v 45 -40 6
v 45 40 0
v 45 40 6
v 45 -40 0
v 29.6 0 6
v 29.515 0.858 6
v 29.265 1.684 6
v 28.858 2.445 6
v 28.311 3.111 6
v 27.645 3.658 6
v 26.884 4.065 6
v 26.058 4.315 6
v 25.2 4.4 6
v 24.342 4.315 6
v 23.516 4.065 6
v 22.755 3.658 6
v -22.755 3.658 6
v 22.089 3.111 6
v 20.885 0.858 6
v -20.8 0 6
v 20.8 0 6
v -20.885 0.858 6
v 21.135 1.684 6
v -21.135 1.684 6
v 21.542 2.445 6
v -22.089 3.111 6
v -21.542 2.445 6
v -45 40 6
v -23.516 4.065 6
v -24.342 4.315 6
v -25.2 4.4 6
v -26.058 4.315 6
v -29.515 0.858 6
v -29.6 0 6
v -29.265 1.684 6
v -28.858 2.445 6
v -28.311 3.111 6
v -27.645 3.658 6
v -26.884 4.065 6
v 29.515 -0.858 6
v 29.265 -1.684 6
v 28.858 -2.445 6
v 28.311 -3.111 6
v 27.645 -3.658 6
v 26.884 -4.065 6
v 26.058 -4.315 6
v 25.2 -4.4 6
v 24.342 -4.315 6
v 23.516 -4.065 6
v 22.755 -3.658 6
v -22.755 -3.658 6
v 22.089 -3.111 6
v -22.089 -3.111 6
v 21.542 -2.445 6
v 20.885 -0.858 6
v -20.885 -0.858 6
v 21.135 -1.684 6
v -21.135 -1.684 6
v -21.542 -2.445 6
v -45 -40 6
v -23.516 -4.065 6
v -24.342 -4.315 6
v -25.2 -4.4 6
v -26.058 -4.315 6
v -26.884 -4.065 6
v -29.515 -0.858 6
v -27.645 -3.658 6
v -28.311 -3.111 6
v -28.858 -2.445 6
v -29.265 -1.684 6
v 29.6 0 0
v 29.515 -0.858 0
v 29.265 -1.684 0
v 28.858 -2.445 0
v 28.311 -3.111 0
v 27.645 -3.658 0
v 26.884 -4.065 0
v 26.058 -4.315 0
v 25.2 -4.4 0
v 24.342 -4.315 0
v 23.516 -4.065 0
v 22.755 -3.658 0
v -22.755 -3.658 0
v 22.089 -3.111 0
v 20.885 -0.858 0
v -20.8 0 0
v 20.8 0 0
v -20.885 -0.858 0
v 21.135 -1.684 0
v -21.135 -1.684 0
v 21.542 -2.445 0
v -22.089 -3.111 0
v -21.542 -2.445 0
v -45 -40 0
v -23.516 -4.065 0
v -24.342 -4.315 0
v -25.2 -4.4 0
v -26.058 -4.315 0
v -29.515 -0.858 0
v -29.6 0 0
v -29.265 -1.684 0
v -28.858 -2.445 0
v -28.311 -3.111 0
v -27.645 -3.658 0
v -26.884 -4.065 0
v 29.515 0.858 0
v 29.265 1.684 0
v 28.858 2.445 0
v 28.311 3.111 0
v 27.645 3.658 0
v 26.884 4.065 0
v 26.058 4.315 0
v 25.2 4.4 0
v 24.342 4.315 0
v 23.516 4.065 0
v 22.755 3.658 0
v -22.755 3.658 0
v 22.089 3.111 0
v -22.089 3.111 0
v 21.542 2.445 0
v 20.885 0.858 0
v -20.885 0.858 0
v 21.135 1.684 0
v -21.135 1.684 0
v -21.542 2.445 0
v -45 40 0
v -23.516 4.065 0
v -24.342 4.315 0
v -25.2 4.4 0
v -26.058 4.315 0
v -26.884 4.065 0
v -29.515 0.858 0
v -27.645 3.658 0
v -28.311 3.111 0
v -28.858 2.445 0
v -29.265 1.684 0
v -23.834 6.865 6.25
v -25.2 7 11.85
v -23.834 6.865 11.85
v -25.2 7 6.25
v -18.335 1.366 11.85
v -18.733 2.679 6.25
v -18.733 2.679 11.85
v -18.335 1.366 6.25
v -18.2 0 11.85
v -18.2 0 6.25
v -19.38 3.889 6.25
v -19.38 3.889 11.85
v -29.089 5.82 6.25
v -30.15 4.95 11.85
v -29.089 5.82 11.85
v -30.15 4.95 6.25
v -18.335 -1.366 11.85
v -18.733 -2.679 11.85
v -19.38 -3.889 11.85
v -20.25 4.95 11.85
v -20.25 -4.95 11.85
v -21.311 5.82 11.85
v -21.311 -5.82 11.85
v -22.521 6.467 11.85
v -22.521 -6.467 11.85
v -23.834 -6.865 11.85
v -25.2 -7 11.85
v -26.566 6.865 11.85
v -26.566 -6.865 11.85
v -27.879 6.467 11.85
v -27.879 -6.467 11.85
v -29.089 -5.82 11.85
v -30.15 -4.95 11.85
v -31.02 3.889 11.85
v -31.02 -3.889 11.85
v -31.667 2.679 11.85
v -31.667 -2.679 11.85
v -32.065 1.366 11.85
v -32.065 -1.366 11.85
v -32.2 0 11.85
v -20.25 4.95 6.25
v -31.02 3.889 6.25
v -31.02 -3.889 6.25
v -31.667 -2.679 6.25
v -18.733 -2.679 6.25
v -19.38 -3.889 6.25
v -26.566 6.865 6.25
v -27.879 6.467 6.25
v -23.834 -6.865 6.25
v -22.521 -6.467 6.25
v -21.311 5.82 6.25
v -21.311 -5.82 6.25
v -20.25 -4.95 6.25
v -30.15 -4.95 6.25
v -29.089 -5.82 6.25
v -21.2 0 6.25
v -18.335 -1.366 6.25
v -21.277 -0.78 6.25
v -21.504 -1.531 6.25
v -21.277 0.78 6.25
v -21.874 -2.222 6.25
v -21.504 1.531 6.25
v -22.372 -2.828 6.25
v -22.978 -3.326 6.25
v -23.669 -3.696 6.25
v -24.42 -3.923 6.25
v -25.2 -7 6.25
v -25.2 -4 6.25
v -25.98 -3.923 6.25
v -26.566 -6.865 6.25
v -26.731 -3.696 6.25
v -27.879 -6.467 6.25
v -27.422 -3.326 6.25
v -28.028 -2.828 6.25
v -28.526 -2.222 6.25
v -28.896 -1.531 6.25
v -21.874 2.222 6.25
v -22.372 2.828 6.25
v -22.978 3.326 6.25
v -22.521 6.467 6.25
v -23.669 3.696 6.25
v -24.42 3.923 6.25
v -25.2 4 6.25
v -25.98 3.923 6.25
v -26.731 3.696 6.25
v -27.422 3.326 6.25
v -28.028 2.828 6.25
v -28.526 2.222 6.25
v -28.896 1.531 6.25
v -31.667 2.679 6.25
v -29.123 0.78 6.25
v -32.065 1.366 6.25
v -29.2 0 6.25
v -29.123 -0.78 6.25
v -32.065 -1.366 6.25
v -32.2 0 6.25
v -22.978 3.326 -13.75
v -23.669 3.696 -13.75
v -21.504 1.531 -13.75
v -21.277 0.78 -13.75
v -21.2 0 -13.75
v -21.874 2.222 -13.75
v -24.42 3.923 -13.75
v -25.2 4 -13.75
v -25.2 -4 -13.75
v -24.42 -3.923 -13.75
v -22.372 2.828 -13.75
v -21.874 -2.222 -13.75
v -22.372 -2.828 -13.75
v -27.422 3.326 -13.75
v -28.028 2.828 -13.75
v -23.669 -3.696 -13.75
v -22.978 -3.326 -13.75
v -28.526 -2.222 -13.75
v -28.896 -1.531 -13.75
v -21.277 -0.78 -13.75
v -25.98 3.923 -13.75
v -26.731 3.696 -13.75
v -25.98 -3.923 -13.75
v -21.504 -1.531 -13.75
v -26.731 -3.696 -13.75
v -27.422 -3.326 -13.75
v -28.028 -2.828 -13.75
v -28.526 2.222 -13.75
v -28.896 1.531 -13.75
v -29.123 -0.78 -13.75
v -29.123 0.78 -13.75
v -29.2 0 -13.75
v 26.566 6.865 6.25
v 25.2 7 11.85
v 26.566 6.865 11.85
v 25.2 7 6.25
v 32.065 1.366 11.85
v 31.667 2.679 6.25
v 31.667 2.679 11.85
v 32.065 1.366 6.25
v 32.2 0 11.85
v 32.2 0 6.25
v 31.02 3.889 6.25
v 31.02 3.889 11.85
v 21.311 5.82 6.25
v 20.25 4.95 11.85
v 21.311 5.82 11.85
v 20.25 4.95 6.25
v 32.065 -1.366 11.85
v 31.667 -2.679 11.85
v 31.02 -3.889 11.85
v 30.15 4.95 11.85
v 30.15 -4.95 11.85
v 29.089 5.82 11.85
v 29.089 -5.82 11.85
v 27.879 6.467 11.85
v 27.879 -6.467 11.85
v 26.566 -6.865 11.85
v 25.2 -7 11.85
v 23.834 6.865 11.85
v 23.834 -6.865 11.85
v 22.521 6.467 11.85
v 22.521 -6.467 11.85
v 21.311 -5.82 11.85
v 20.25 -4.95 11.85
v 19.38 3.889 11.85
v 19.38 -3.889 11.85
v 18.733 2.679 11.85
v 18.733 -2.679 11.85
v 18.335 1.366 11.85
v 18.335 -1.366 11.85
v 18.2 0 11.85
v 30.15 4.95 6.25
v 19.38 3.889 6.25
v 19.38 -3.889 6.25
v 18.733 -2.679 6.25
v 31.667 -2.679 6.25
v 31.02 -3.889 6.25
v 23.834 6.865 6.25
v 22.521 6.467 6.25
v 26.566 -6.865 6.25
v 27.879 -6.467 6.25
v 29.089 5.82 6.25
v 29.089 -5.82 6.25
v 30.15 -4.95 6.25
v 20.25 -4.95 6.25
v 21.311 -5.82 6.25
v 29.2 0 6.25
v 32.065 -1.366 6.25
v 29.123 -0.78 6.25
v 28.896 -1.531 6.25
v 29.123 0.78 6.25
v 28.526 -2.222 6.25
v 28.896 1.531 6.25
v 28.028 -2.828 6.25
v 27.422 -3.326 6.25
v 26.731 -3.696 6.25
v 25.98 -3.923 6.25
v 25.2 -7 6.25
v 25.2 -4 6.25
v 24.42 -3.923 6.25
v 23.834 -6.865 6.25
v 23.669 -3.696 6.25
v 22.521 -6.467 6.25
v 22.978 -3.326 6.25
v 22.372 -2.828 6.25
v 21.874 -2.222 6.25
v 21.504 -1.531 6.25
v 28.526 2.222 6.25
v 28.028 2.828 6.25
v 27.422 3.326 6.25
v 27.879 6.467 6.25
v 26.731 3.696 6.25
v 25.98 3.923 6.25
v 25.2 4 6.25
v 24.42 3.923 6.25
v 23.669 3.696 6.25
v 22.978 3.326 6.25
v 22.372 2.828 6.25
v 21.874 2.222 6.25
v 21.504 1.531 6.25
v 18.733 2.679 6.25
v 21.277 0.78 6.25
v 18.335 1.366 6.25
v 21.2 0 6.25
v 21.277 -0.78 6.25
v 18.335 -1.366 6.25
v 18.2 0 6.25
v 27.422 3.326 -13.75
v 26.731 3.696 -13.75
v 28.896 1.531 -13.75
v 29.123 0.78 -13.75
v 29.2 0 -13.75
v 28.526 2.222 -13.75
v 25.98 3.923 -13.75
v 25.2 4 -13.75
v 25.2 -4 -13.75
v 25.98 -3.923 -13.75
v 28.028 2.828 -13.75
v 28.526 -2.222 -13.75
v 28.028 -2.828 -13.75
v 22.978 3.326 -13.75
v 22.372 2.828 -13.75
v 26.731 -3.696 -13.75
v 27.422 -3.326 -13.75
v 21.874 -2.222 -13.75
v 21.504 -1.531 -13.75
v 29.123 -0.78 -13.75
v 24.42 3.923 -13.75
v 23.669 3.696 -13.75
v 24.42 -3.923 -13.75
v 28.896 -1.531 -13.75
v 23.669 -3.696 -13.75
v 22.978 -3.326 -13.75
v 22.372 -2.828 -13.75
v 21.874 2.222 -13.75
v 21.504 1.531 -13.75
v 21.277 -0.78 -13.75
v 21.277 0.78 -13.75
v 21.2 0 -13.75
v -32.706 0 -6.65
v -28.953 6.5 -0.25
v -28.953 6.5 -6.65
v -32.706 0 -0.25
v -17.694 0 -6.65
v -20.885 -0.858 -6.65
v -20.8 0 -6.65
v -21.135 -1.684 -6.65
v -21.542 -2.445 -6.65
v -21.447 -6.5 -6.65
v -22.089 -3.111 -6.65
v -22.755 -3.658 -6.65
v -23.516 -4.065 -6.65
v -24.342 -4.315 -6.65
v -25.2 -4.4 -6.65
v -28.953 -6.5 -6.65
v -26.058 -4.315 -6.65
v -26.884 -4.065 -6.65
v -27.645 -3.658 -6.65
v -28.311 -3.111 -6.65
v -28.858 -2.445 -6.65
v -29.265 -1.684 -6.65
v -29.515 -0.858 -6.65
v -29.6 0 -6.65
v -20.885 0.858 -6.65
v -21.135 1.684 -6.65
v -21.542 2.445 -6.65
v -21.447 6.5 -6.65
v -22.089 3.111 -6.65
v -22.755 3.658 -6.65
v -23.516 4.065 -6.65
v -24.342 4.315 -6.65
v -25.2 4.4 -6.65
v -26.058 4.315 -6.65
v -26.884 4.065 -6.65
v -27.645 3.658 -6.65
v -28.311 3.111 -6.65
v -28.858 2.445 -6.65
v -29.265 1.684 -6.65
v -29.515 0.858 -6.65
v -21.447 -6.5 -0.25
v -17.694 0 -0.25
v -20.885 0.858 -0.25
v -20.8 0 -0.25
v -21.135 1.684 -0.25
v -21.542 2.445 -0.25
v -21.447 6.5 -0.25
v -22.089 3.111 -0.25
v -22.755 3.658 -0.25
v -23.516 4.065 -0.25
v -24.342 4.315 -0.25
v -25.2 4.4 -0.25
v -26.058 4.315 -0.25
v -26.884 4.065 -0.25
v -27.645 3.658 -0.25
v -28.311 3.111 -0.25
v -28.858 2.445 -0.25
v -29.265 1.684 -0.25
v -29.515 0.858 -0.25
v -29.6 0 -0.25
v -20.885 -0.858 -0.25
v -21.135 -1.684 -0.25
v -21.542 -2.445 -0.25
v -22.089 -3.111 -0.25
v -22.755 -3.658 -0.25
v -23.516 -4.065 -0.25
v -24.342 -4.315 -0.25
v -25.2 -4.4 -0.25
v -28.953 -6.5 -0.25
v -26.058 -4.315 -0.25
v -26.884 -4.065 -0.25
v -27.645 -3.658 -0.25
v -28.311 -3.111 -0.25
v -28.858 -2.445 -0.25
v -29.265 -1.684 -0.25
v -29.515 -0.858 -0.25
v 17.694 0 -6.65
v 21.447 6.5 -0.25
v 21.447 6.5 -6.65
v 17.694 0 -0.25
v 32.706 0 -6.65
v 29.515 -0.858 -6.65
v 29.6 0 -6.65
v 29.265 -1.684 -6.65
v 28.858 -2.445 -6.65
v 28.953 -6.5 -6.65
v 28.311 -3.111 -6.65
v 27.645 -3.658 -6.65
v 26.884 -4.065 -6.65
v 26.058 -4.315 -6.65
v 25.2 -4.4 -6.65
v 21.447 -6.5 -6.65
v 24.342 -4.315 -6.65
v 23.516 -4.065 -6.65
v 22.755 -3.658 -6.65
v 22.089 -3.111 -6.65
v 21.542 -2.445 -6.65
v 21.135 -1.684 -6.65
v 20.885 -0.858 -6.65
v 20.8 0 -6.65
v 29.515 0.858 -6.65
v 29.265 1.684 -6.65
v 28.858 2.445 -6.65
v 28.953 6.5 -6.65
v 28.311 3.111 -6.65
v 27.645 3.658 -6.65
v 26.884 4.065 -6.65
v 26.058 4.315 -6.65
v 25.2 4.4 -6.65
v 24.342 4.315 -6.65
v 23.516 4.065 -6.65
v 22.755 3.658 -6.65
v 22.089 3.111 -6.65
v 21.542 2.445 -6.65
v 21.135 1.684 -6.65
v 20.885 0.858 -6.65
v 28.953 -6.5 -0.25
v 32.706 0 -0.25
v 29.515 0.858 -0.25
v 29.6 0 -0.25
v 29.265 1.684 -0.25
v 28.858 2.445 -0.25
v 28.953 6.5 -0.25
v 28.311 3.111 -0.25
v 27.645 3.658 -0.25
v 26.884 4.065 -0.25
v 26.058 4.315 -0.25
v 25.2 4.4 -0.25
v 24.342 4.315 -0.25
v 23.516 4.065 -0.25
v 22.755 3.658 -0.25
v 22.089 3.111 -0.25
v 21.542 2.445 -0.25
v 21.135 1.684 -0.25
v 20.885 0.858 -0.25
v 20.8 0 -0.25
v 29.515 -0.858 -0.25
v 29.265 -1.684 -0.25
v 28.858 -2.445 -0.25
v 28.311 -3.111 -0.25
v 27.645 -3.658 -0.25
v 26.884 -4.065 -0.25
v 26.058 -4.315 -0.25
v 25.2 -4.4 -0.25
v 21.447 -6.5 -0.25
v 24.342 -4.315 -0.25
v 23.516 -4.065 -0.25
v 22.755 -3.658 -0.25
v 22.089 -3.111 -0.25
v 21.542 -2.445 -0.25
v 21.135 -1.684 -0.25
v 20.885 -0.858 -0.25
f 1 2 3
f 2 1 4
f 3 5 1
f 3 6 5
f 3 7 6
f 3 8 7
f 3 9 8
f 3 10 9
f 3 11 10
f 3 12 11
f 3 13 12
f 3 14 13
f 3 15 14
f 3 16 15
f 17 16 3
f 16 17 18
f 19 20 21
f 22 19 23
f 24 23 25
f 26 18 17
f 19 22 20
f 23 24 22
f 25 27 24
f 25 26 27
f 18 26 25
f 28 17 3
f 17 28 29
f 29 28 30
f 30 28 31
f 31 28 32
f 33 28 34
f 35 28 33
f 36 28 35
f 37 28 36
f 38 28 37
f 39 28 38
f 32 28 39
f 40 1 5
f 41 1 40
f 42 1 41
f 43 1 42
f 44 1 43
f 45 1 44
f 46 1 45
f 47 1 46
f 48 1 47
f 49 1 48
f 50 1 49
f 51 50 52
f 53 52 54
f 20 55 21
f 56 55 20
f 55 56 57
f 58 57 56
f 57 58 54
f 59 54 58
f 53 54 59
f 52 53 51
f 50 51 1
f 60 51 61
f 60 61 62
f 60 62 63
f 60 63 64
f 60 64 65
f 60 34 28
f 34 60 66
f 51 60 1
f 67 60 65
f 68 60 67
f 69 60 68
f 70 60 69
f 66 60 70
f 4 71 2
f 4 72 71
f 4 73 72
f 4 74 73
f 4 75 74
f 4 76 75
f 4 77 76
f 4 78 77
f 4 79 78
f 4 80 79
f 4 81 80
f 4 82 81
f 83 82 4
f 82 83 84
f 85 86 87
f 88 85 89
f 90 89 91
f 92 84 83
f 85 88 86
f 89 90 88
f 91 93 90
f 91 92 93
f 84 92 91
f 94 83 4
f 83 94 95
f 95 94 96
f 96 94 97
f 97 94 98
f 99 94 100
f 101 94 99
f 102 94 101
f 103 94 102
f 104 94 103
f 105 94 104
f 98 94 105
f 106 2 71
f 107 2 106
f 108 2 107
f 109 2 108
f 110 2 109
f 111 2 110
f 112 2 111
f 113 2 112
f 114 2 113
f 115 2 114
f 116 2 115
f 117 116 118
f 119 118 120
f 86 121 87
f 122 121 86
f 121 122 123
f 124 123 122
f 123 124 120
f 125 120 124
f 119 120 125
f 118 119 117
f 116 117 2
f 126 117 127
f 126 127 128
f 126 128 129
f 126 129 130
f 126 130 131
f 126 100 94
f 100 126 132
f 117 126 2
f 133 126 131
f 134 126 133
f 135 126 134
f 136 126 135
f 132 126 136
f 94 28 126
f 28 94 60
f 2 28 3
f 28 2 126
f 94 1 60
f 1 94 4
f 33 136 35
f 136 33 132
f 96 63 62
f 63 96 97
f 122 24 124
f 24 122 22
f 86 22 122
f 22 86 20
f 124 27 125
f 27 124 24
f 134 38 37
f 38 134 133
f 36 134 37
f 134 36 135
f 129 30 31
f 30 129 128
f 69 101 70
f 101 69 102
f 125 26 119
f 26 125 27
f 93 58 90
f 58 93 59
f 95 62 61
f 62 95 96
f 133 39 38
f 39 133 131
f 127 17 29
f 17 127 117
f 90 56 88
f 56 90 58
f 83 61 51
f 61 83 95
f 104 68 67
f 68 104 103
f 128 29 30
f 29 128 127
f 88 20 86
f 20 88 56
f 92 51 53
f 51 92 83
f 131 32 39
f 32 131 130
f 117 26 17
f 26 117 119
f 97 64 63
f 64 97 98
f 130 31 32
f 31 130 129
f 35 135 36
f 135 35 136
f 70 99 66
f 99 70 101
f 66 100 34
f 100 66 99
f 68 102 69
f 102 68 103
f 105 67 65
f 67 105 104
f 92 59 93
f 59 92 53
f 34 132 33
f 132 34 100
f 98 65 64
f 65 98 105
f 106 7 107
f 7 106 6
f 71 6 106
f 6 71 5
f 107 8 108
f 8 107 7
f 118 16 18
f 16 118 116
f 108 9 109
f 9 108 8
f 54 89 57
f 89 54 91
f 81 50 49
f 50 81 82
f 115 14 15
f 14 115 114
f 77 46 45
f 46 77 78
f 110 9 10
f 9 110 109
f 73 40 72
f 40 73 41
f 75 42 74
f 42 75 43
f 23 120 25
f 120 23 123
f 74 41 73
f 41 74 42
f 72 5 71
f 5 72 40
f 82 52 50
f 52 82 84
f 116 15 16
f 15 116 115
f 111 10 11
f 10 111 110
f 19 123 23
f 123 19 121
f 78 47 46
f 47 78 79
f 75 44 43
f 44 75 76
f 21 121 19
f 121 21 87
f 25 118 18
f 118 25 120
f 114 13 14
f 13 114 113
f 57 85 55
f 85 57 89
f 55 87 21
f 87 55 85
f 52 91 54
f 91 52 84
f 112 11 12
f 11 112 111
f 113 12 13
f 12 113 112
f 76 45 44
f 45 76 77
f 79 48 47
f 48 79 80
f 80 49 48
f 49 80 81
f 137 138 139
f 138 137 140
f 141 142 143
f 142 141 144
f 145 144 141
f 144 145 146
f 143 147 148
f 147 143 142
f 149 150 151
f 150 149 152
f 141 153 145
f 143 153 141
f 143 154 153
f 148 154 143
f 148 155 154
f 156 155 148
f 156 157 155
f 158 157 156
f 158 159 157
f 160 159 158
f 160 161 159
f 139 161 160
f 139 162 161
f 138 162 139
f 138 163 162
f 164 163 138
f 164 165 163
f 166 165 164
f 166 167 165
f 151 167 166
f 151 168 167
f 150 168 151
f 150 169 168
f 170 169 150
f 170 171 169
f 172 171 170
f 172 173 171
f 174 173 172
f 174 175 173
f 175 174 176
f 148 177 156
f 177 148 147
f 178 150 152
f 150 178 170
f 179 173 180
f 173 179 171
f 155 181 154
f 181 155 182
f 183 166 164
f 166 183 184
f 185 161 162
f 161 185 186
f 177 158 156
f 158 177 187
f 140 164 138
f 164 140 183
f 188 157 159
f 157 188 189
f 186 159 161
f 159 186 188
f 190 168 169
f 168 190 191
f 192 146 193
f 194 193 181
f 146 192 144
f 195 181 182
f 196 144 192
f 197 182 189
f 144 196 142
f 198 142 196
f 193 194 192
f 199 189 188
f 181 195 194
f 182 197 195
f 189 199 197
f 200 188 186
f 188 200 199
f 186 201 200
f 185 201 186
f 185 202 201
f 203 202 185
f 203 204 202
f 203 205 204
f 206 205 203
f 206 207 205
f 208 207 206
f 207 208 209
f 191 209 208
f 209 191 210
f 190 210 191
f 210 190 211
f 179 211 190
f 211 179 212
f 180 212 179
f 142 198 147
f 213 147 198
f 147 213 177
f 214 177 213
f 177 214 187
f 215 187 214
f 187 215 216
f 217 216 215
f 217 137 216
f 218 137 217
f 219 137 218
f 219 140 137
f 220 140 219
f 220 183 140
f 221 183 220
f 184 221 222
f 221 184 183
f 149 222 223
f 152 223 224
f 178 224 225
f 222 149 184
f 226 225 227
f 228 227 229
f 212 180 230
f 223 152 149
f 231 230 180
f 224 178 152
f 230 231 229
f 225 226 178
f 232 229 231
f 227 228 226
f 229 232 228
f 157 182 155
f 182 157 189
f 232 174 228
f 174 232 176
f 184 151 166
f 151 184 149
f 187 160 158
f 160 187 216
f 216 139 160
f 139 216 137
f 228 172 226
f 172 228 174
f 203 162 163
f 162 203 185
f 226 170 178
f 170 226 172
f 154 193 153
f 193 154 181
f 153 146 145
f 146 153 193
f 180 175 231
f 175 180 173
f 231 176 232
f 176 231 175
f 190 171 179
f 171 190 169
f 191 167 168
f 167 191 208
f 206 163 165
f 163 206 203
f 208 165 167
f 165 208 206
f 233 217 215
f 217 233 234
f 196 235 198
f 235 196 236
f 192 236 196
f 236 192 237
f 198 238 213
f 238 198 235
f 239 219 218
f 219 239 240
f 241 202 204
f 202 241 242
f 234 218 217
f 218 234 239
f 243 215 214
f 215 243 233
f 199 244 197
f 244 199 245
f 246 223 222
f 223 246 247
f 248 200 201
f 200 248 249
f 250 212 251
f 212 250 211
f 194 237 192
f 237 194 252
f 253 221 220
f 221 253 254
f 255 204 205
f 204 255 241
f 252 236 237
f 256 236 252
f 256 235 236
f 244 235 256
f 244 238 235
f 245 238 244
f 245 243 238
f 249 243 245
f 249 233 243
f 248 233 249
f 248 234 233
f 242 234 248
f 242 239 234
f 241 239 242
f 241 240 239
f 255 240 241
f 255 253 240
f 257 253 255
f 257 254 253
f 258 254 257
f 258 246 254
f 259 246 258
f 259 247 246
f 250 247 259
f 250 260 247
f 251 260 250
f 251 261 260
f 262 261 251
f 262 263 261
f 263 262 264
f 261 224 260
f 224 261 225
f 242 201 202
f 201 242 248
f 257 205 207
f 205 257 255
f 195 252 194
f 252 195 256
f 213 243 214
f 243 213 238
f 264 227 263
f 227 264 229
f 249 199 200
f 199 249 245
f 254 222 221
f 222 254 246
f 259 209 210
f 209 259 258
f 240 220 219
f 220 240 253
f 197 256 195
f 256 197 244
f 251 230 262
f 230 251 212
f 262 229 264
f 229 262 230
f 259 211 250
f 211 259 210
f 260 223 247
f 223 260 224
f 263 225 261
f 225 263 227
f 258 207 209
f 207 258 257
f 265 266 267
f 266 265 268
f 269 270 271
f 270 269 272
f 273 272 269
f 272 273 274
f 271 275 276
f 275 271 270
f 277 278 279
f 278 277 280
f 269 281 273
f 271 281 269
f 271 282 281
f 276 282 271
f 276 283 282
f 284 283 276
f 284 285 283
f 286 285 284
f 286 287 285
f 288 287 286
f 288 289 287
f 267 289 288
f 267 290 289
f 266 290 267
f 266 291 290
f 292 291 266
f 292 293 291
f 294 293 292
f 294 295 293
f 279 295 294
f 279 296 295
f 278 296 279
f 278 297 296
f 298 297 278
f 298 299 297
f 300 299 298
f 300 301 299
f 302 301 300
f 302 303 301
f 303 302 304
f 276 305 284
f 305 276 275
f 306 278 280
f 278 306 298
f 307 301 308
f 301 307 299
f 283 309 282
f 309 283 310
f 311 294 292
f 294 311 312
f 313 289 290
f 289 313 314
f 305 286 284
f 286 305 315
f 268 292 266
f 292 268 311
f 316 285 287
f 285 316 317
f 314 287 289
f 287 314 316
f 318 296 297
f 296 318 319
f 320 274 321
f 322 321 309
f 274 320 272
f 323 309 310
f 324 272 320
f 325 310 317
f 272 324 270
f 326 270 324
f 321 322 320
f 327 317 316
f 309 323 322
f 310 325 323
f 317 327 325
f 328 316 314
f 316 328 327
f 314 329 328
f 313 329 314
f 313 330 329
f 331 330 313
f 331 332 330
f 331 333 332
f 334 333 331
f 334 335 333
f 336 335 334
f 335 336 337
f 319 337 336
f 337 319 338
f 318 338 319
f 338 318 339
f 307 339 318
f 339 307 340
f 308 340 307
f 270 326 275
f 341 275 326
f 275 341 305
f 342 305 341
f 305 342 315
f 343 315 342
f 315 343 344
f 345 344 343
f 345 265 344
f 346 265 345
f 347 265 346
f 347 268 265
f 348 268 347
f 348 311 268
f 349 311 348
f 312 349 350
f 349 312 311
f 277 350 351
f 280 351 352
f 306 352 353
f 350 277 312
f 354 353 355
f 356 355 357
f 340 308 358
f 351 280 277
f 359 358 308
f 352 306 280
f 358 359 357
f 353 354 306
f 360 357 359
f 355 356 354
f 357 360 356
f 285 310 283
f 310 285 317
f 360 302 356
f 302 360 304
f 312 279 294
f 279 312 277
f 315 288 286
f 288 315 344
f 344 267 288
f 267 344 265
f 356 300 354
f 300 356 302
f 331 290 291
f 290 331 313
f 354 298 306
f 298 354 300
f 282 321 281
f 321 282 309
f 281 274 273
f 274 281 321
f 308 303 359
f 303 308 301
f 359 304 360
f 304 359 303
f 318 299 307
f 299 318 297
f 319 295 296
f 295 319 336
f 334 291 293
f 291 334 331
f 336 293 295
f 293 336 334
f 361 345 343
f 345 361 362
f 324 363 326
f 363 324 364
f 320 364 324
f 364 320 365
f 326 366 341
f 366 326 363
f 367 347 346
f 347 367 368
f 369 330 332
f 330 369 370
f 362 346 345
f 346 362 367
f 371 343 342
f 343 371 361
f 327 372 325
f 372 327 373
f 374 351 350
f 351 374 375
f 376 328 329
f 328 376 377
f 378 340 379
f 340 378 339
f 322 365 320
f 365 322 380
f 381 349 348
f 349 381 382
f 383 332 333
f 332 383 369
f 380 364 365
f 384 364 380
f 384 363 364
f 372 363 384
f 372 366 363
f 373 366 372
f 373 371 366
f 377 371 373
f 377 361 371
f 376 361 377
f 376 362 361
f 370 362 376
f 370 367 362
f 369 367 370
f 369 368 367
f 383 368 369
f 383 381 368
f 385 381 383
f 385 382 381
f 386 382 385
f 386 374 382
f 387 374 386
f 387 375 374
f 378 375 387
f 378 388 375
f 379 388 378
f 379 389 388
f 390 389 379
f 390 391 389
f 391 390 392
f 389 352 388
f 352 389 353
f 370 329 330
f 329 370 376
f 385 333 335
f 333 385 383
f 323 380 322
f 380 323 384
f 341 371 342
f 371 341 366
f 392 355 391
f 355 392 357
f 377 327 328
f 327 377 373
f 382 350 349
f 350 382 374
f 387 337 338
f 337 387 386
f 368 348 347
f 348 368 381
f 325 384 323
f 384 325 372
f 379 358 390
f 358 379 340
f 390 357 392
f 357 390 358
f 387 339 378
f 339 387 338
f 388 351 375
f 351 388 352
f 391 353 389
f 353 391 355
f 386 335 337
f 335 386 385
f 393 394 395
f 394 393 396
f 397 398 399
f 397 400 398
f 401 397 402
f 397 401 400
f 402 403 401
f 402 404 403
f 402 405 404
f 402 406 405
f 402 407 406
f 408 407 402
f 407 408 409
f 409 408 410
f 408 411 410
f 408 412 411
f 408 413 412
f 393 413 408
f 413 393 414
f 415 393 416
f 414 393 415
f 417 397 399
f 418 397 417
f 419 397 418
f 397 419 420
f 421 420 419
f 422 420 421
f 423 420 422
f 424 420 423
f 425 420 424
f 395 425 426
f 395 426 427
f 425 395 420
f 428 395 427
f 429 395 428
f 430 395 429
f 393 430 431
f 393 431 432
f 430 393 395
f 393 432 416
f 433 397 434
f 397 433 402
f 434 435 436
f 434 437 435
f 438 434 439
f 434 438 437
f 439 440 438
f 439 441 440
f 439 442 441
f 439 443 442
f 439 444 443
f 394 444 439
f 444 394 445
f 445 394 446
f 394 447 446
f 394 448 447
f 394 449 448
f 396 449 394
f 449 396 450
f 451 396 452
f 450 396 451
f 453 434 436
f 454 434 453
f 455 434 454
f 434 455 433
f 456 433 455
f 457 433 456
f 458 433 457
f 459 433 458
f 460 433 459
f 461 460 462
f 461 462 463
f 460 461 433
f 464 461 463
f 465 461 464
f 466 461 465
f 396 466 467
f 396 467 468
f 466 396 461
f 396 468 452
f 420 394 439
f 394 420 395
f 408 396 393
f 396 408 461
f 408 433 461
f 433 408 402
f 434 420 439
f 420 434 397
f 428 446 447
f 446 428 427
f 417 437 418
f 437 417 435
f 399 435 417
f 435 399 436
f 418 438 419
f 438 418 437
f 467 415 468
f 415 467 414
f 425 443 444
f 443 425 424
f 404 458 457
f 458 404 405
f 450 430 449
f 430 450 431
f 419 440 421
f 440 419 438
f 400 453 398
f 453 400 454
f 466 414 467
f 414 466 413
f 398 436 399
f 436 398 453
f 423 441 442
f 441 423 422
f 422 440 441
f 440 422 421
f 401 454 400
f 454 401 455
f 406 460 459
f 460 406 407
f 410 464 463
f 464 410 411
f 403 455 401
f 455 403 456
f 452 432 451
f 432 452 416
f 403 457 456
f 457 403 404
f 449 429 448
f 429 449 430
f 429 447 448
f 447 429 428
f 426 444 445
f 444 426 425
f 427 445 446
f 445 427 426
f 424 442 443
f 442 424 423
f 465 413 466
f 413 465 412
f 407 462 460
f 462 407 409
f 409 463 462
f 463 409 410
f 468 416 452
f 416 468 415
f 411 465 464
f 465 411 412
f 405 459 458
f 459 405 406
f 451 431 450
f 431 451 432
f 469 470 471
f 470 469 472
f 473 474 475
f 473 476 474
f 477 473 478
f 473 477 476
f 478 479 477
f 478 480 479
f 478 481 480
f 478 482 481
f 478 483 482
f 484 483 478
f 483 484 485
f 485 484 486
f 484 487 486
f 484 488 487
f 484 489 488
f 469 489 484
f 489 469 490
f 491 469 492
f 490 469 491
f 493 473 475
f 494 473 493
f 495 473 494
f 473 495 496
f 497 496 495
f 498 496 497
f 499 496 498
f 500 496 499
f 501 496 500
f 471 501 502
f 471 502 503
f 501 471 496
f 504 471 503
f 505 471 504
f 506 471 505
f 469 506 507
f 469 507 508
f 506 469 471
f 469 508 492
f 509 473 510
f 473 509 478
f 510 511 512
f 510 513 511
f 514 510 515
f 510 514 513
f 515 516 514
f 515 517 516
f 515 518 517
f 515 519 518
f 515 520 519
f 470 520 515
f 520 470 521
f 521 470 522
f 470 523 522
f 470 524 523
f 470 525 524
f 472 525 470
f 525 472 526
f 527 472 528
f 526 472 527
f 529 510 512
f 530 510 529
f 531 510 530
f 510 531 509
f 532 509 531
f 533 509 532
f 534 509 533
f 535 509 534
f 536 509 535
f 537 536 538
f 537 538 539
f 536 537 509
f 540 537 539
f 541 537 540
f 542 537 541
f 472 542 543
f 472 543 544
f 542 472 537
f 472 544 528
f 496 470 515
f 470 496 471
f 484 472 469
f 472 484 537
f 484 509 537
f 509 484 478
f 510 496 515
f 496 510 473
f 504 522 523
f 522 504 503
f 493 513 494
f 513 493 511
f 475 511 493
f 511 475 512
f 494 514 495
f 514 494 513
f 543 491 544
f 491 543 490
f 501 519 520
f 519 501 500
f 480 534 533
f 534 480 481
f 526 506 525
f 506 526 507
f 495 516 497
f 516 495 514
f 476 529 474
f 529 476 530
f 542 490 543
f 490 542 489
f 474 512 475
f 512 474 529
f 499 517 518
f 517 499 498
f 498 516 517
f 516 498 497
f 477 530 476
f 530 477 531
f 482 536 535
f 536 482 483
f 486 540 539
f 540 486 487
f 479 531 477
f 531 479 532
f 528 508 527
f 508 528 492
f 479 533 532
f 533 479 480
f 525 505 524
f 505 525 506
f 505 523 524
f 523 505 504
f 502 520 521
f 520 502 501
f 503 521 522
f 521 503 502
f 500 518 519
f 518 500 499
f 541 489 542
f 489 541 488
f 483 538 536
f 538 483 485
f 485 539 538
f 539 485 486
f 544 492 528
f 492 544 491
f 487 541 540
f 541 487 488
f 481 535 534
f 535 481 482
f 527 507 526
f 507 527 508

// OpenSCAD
$fn = 32;

// ------------------------------------------------------------------------
// Bolted plate: 90 x 80 x 6 mm plate, 2 fasteners
// Every part is its own module, assembly() places them once.
// ------------------------------------------------------------------------

// --- part 1 ---
module plate() {
  difference() {
    translate([-45, -40, 0]) cube([90, 80, 6]);
    translate([-25.2, 0, -1]) cylinder(h = 8, d = 8.8);
    translate([25.2, 0, -1]) cylinder(h = 8, d = 8.8);
  }
}

// --- part 2 ---
module bolt1() {
  cylinder(h = 5.6, d = 14);
  translate([0, 0, -20]) cylinder(h = 20, d = 8);
}

// --- part 3 ---
module bolt2() {
  cylinder(h = 5.6, d = 14);
  translate([0, 0, -20]) cylinder(h = 20, d = 8);
}

// --- part 4 ---
module nut1() {
  difference() {
    linear_extrude(height = 6.4) polygon(points = [[7.506, 0], [3.753, 6.5], [-3.753, 6.5], [-7.506, 0], [-3.753, -6.5], [3.753, -6.5]]);
    translate([0, 0, -1]) cylinder(h = 8.4, d = 8.8);
  }
}

// --- part 5 ---
module nut2() {
  difference() {
    linear_extrude(height = 6.4) polygon(points = [[7.506, 0], [3.753, 6.5], [-3.753, 6.5], [-7.506, 0], [-3.753, -6.5], [3.753, -6.5]]);
    translate([0, 0, -1]) cylinder(h = 8.4, d = 8.8);
  }
}

// --- assembly ---
module assembly() {
  translate([0, 0, 0]) rotate([0, 0, 0]) plate();
  translate([-25.2, 0, 6.25]) rotate([0, 0, 0]) bolt1();
  translate([25.2, 0, 6.25]) rotate([0, 0, 0]) bolt2();
  translate([-25.2, 0, -6.65]) rotate([0, 0, 0]) nut1();
  translate([25.2, 0, -6.65]) rotate([0, 0, 0]) nut2();
}

assembly();
